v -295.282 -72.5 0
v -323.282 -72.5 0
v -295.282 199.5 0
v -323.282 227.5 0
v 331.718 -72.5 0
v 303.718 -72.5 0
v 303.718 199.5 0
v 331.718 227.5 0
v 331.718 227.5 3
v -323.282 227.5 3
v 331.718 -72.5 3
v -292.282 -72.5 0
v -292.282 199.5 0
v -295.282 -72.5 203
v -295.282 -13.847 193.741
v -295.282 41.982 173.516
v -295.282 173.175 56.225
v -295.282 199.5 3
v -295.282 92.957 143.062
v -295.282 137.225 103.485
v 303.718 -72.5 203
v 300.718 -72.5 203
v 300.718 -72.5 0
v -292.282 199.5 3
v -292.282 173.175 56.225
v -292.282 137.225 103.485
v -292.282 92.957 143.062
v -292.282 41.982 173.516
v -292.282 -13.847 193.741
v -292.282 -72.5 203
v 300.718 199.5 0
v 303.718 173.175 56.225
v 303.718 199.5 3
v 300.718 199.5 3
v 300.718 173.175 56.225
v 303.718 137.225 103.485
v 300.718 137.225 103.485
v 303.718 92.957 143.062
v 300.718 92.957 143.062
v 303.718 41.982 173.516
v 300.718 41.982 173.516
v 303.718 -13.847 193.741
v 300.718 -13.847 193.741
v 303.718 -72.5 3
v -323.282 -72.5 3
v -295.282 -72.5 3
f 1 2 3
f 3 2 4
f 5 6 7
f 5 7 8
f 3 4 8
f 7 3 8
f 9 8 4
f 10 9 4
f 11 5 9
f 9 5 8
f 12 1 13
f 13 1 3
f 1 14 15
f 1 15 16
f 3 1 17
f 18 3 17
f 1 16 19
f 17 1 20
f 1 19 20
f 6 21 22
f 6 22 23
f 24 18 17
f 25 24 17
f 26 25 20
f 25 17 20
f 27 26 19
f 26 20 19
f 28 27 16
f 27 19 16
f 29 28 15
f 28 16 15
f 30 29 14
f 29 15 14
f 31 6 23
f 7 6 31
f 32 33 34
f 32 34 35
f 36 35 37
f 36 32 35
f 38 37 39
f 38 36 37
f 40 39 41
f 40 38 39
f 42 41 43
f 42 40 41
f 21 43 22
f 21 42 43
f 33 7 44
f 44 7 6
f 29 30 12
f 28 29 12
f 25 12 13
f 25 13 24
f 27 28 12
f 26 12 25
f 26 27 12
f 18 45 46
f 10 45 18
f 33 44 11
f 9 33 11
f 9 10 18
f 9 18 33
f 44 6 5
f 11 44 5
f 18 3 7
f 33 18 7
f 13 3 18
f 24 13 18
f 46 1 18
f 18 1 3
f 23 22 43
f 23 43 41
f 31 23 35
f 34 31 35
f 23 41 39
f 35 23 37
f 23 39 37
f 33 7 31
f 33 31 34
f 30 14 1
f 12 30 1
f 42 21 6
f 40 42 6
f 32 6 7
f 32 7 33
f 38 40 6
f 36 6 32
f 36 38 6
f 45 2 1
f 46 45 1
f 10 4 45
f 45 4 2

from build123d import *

# Parameters (mm, degrees)
F1_DEPTH = 3
F2_W     = 272
F2_H     = 3
F3_DEPTH = 3


with BuildPart() as f1:
    # F0 (on Top) → F1 (new body)
    with BuildSketch(Plane.XY):
        Polygon((303.7182253674, -72.5), (331.7182253674, -72.5), (331.7182253674, 227.5), (-323.2817746326, 227.5), (-323.2817746326, -72.5), (-295.2817746326, -72.5), (-295.2817746326, 199.5), (303.7182253674, 199.5), align=None)
    extrude(amount=F1_DEPTH)


with BuildPart() as f3:
    # F2 (on face) → F3 (new body)
    with BuildSketch(Plane.YZ.offset(-295.2817746326)):
        with BuildLine():
            Line((-72.5, 203), (-72.5, 3))
            Line((-72.5, 3), (199.5, 3))
            ThreePointArc((199.5, 3), (92.9573455668, 143.0619899708), (-72.5, 203))
        make_face()
        with Locations((63.5, 1.5)):
            Rectangle(F2_W, F2_H)
    extrude(amount=F3_DEPTH)


with BuildPart() as f6_1:
    # F6: instance of F3
    add(f3.part.mirror(Plane.YZ.offset(4.2182253674)))


solid = Compound([f1.part, f3.part, f6_1.part])
